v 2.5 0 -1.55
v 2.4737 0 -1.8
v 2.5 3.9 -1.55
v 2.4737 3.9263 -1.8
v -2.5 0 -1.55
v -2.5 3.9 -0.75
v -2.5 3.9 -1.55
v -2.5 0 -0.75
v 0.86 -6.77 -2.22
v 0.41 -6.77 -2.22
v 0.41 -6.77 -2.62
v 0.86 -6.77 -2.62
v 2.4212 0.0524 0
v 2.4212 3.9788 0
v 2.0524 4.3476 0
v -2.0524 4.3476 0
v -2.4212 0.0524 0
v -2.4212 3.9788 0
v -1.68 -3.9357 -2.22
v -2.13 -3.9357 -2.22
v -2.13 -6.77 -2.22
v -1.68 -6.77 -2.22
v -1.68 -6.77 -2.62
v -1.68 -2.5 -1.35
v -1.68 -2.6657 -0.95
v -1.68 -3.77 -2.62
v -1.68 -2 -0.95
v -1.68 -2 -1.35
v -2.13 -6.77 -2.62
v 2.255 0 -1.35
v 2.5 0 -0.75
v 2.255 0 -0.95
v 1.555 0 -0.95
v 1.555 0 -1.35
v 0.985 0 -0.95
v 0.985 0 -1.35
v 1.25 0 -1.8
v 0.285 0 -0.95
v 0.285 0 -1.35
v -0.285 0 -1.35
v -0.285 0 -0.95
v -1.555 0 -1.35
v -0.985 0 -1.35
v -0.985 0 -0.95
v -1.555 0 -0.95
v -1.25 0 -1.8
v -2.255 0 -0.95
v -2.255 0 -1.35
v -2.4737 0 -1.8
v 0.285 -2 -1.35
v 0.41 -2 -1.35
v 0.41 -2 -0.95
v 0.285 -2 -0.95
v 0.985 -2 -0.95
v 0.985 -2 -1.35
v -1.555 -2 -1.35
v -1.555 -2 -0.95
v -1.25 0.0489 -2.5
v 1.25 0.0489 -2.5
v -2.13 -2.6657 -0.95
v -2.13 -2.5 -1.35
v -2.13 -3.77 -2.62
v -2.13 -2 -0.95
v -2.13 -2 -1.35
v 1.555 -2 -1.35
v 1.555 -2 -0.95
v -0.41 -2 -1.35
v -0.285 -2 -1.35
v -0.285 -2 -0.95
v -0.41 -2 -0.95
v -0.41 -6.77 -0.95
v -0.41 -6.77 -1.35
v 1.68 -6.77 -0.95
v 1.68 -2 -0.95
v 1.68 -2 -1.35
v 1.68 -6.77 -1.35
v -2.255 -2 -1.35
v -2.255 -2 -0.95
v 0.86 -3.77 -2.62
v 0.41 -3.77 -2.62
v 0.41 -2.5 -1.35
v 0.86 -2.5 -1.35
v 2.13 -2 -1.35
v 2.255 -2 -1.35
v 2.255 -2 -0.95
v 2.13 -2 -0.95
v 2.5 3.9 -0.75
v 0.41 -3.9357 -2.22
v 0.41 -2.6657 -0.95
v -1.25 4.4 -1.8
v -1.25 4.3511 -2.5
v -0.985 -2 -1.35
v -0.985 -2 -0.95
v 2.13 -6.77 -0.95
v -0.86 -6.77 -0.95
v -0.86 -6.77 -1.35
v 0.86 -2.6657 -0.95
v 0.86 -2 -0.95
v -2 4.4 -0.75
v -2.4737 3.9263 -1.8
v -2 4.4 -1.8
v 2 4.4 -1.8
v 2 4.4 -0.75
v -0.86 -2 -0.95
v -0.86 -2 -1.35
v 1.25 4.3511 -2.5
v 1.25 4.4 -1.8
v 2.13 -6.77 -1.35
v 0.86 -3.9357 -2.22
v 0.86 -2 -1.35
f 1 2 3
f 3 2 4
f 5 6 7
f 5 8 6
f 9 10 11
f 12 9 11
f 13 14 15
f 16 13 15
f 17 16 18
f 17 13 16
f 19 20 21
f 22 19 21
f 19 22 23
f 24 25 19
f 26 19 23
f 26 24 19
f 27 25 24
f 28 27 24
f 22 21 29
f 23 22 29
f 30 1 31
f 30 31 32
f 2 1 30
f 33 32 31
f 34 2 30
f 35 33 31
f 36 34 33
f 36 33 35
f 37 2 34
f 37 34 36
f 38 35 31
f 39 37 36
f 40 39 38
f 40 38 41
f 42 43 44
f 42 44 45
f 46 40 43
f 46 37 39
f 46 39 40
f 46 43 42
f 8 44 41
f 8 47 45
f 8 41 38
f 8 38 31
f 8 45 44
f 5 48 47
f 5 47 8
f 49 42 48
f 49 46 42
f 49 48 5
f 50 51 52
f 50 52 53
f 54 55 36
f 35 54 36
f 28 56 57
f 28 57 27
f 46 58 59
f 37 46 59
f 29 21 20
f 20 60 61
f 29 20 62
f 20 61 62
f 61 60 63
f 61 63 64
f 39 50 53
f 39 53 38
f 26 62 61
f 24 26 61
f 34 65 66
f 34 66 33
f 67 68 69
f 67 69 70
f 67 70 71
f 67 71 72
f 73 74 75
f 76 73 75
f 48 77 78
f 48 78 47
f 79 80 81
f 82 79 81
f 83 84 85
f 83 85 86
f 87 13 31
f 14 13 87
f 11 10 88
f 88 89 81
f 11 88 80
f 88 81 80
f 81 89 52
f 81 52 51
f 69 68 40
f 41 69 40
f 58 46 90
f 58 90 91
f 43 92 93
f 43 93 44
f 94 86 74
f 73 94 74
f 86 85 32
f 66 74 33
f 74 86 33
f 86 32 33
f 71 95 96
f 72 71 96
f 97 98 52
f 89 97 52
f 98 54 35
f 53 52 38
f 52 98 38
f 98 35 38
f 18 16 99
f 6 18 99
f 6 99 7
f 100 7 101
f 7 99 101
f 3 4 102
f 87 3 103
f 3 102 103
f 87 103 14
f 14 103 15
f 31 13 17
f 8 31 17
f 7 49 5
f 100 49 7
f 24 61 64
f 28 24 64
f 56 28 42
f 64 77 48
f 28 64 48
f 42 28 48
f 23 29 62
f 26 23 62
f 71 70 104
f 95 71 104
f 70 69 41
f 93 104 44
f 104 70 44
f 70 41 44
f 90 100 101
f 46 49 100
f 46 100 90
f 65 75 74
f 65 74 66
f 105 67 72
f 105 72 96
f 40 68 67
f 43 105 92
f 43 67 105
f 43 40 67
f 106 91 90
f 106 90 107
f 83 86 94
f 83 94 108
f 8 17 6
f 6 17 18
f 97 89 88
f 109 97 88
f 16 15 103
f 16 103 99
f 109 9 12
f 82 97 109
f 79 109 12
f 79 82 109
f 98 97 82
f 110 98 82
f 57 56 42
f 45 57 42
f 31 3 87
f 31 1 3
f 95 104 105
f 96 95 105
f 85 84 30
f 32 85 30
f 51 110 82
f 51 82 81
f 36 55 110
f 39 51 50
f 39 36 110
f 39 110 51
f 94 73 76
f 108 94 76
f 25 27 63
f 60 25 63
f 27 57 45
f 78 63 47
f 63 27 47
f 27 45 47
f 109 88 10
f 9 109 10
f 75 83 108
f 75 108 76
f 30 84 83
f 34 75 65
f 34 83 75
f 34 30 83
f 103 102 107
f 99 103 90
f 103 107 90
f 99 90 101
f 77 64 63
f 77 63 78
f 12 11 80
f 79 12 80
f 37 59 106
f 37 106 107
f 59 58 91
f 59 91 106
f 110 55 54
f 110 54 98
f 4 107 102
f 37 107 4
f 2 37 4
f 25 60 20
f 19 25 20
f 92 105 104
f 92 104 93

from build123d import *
from OCP.BRepFilletAPI import BRepFilletAPI_MakeChamfer

# Parameters (mm, degrees)
BOSS_EXTRUDE1_DEPTH = 4.4
CHAMFER5_SIZE       = 0.5
CHAMFER1_SIZE       = 0.25
CHAMFER1_SIZE2      = 0.026276059
CHAMFER2_SIZE       = 0.75
CHAMFER2_SIZE2      = 0.078828176
CHAMFER3_SIZE       = 0.75
CHAMFER3_SIZE2      = 0.052445109
CHAMFER4_SIZE       = 0.7
CHAMFER4_SIZE2      = 0.048948768
BOSS_EXTRUDE2_START = 0.41
BOSS_EXTRUDE2_DEPTH = 0.45
BOSS_EXTRUDE3_START = 1.68
SKETCH5_W           = 0.4
SKETCH5_H           = 6.77
BOSS_EXTRUDE3_DEPTH = 0.45
LPATTERN1_COUNT     = 2
LPATTERN1_PITCH     = 2.54
SKETCH6_W           = 0.125
SKETCH6_H           = 2
BOSS_EXTRUDE4_DEPTH = 0.4
LPATTERN2_COUNT     = 4
LPATTERN2_PITCH     = 1.27


with BuildPart() as part:
    # Sketch1 → Boss-Extrude1 (new body)
    with BuildSketch(Plane(origin=(0, 0, 0), x_dir=(1, 0, 0), z_dir=(0, 1, 0))):
        Polygon((-2.5, 0), (-2.5, 1.8), (-1.25, 1.8), (-1.25, 2.5), (1.25, 2.5), (1.25, 1.8), (2.5, 1.8), (2.5, 0), align=None)
    extrude(amount=BOSS_EXTRUDE1_DEPTH)

    # Chamfer5
    chamfer5_edges = [part.edges().sort_by_distance(p)[0] for p in [
        (-2.5, 4.4, -0.9),
        (2.5, 4.4, -0.9),
    ]]
    chamfer(chamfer5_edges, length=CHAMFER5_SIZE)

    # Chamfer1: one chamfer whose edges measure the first distance from different faces: ONE call of the kernel's chamfer builder (chamfer() names one face for all edges)
    chamfer1_edges_1 = [part.edges().sort_by_distance(p)[0] for p in [
        (2.5, 1.95, -1.8),
    ]]
    chamfer1_side_1 = [part.faces().sort_by_distance(p)[0] for p in [
        (2.5, 1.95, -0.9),
    ]]
    chamfer1_edges_2 = [part.edges().sort_by_distance(p)[0] for p in [
        (-2.5, 1.95, -1.8),
    ]]
    chamfer1_side_2 = [part.faces().sort_by_distance(p)[0] for p in [
        (-2.5, 1.95, -0.9),
    ]]
    chamfer1 = BRepFilletAPI_MakeChamfer(part.part.solid().wrapped)
    for e in chamfer1_edges_1:
        chamfer1.Add(CHAMFER1_SIZE, CHAMFER1_SIZE2, e.wrapped, chamfer1_side_1[0].wrapped)  # the first distance lies on this face
    for e in chamfer1_edges_2:
        chamfer1.Add(CHAMFER1_SIZE, CHAMFER1_SIZE2, e.wrapped, chamfer1_side_2[0].wrapped)  # the first distance lies on this face
    add(Compound.cast(chamfer1.Shape()), mode=Mode.REPLACE)

    # Chamfer2: one chamfer whose edges measure the first distance from different faces: ONE call of the kernel's chamfer builder (chamfer() names one face for all edges)
    chamfer2_edges_1 = [part.edges().sort_by_distance(p)[0] for p in [
        (2.5, 1.95, 0),
    ]]
    chamfer2_side_1 = [part.faces().sort_by_distance(p)[0] for p in [
        (2.5, 1.95, -0.775),
    ]]
    chamfer2_edges_2 = [part.edges().sort_by_distance(p)[0] for p in [
        (-2.5, 1.95, 0),
    ]]
    chamfer2_side_2 = [part.faces().sort_by_distance(p)[0] for p in [
        (-2.5, 1.95, -0.775),
    ]]
    chamfer2 = BRepFilletAPI_MakeChamfer(part.part.solid().wrapped)
    for e in chamfer2_edges_1:
        chamfer2.Add(CHAMFER2_SIZE, CHAMFER2_SIZE2, e.wrapped, chamfer2_side_1[0].wrapped)  # the first distance lies on this face
    for e in chamfer2_edges_2:
        chamfer2.Add(CHAMFER2_SIZE, CHAMFER2_SIZE2, e.wrapped, chamfer2_side_2[0].wrapped)  # the first distance lies on this face
    add(Compound.cast(chamfer2.Shape()), mode=Mode.REPLACE)

    # Chamfer3: one chamfer whose edges measure the first distance from different faces: ONE call of the kernel's chamfer builder (chamfer() names one face for all edges)
    chamfer3_edges_1 = [part.edges().sort_by_distance(p)[0] for p in [
        (0, 4.4, 0),
    ]]
    chamfer3_side_1 = [part.faces().sort_by_distance(p)[0] for p in [
        (0, 4.4, -1.144413408),
    ]]
    chamfer3_edges_2 = [part.edges().sort_by_distance(p)[0] for p in [
        (0, 0, 0),
    ]]
    chamfer3_side_2 = [part.faces().sort_by_distance(p)[0] for p in [
        (0, 0, -1.107834111),
    ]]
    chamfer3 = BRepFilletAPI_MakeChamfer(part.part.solid().wrapped)
    for e in chamfer3_edges_1:
        chamfer3.Add(CHAMFER3_SIZE, CHAMFER3_SIZE2, e.wrapped, chamfer3_side_1[0].wrapped)  # the first distance lies on this face
    for e in chamfer3_edges_2:
        chamfer3.Add(CHAMFER3_SIZE, CHAMFER3_SIZE2, e.wrapped, chamfer3_side_2[0].wrapped)  # the first distance lies on this face
    add(Compound.cast(chamfer3.Shape()), mode=Mode.REPLACE)

    # Chamfer4: one chamfer whose edges measure the first distance from different faces: ONE call of the kernel's chamfer builder (chamfer() names one face for all edges)
    chamfer4_edges_1 = [part.edges().sort_by_distance(p)[0] for p in [
        (0, 0, -2.5),
    ]]
    chamfer4_side_1 = [part.faces().sort_by_distance(p)[0] for p in [
        (0, 0, -1.493540612),
    ]]
    chamfer4_edges_2 = [part.edges().sort_by_distance(p)[0] for p in [
        (0, 4.4, -2.5),
    ]]
    chamfer4_side_2 = [part.faces().sort_by_distance(p)[0] for p in [
        (0, 4.4, -1.532352941),
    ]]
    chamfer4 = BRepFilletAPI_MakeChamfer(part.part.solid().wrapped)
    for e in chamfer4_edges_1:
        chamfer4.Add(CHAMFER4_SIZE, CHAMFER4_SIZE2, e.wrapped, chamfer4_side_1[0].wrapped)  # the first distance lies on this face
    for e in chamfer4_edges_2:
        chamfer4.Add(CHAMFER4_SIZE, CHAMFER4_SIZE2, e.wrapped, chamfer4_side_2[0].wrapped)  # the first distance lies on this face
    add(Compound.cast(chamfer4.Shape()), mode=Mode.REPLACE)

    # Sketch4 → Boss-Extrude2 (add)
    with BuildSketch(Plane(origin=(0, 0, 0), x_dir=(0, 0, -1), z_dir=(1, 0, 0)).offset(BOSS_EXTRUDE2_START)):
        Polygon((0.95, 0), (0.95, -2.665685425), (2.22, -3.935685425), (2.22, -6.77), (2.62, -6.77), (2.62, -3.77), (1.35, -2.5), (1.35, 0), align=None)
    boss_extrude2 = extrude(amount=BOSS_EXTRUDE2_DEPTH)

    # Sketch5 → Boss-Extrude3 (add)
    with BuildSketch(Plane(origin=(0, 0, 0), x_dir=(0, 0, -1), z_dir=(1, 0, 0)).offset(BOSS_EXTRUDE3_START)):
        with Locations((1.15, -3.385)):
            Rectangle(SKETCH5_W, SKETCH5_H)
    boss_extrude3 = extrude(amount=BOSS_EXTRUDE3_DEPTH)

    # LPattern1: Boss-Extrude2, Boss-Extrude3 ×2
    with Locations(*[(-i * LPATTERN1_PITCH, 0, 0) for i in range(1, LPATTERN1_COUNT)]):
        add(boss_extrude2)
        add(boss_extrude3)

    # Sketch6 → Boss-Extrude4 (add)
    with BuildSketch(Plane(origin=(0, 0, -1.35), x_dir=(-1, 0, 0), z_dir=(0, 0, -1))):
        with Locations((-2.1925, -1)):
            Rectangle(SKETCH6_W, SKETCH6_H)
        with Locations((-1.6175, -1)):
            Rectangle(SKETCH6_W, SKETCH6_H)
    boss_extrude4 = extrude(amount=-BOSS_EXTRUDE4_DEPTH)

    # LPattern2: Boss-Extrude4 ×4
    with Locations(*[(-i * LPATTERN2_PITCH, 0, 0) for i in range(1, LPATTERN2_COUNT)]):
        add(boss_extrude4)


solid = part.part
